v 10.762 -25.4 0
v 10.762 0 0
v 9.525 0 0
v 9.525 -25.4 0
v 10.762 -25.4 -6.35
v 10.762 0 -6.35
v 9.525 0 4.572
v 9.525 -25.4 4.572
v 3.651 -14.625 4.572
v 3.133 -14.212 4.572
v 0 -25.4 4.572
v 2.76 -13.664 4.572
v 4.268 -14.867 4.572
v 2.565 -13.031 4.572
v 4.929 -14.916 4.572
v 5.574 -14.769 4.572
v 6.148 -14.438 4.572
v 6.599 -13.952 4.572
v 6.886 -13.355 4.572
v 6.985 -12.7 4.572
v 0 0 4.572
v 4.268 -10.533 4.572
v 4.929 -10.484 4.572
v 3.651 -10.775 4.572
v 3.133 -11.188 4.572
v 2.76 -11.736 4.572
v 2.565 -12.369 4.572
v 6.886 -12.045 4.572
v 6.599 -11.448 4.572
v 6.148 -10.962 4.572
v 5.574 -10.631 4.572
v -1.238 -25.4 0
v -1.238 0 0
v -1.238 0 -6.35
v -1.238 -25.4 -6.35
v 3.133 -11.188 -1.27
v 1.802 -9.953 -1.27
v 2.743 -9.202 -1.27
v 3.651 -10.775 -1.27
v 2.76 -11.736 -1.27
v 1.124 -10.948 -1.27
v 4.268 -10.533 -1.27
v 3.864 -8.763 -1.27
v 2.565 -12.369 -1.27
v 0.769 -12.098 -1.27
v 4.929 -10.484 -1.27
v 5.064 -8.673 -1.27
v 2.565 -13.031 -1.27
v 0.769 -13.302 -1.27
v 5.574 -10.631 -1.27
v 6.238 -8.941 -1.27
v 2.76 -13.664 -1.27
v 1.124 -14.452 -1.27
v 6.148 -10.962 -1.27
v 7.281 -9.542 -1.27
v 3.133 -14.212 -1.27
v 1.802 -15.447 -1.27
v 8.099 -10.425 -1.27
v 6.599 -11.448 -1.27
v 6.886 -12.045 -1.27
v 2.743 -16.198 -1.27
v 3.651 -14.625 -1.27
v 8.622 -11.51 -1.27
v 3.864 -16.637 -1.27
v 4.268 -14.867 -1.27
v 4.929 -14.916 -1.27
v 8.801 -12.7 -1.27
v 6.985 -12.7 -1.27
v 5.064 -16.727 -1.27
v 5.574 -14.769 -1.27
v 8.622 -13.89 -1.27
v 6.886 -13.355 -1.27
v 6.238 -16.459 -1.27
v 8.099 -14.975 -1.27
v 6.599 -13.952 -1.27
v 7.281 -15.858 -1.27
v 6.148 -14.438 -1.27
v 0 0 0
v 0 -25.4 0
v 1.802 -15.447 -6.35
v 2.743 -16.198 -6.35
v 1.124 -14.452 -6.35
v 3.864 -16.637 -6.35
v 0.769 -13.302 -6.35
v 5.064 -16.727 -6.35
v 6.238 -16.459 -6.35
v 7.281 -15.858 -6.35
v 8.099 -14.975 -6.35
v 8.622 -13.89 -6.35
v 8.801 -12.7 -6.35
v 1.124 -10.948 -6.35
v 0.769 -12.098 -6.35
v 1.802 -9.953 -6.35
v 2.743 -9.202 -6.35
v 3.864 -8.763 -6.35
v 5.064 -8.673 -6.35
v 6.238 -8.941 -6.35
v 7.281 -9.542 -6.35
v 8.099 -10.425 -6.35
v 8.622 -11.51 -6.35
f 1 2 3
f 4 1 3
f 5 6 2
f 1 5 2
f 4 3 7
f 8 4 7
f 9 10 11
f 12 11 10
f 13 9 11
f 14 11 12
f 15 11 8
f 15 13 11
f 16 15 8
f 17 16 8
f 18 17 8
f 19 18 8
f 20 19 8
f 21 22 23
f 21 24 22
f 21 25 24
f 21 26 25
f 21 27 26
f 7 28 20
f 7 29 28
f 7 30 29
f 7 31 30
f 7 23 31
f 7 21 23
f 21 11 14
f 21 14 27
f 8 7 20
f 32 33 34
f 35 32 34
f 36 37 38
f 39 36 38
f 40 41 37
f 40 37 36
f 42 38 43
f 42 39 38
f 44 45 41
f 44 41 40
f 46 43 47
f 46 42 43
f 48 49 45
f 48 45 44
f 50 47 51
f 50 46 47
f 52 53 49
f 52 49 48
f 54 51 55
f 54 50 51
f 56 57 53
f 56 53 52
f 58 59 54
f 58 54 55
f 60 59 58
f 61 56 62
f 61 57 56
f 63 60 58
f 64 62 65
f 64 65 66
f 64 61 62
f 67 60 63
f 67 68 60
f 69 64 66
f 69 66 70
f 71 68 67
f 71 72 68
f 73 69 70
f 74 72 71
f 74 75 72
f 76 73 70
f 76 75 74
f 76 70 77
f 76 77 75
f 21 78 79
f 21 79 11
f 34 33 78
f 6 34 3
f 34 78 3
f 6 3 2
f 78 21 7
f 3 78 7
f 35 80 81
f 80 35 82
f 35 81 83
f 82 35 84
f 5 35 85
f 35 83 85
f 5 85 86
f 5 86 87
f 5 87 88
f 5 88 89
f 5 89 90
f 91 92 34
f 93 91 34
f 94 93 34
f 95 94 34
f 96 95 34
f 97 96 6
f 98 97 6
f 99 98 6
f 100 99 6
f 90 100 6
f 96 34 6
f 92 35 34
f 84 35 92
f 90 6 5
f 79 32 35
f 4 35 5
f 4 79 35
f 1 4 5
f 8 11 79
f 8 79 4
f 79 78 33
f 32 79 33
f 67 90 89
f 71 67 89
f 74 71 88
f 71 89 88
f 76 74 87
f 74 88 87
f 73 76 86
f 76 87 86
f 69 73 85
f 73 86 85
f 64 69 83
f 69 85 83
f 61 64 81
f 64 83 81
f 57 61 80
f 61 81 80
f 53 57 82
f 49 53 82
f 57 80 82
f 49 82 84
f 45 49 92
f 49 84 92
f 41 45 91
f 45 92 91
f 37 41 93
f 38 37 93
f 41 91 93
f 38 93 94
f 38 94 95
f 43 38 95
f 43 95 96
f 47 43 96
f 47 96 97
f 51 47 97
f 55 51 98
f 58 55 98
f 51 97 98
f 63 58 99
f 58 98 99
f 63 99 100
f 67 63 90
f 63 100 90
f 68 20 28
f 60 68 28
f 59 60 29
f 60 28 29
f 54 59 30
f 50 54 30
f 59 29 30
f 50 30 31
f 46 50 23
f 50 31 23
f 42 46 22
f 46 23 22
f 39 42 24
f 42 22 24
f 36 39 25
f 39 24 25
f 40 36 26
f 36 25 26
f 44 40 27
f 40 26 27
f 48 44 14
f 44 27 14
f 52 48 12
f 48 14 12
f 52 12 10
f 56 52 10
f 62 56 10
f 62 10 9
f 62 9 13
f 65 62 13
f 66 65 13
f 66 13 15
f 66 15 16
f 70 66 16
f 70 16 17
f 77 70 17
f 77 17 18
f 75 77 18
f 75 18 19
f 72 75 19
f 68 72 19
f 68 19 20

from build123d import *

# Parameters (mm, degrees)
F0_W     = 9.525
F0_H     = 4.572
F1_DEPTH = 25.4
F2_R     = 2.2225
F3_DEPTH = 10.923
F4_R     = 4.0386
F5_DEPTH = 5.08


with BuildPart() as f1:
    # F0 (on Front) → F1 (new body)
    with BuildSketch(Plane.XZ):
        with Locations((4.7625, 2.286)):
            Rectangle(F0_W, F0_H)
        Polygon((9.525, 0), (0, 0), (-1.2375, 0), (-1.2375, -6.35), (10.7625, -6.35), (10.7625, 0), align=None)
    extrude(amount=F1_DEPTH)

    # F2 (on face) → F3 (cut, through all)
    with BuildSketch(Plane.XY.offset(4.572)):
        with Locations((4.7625, -12.7)):
            Circle(F2_R)
    extrude(amount=-F3_DEPTH, mode=Mode.SUBTRACT)

    # F4 (on face) → F5 (cut)
    with BuildSketch(Plane(origin=(0, 0, -6.35), x_dir=(1, 0, 0), z_dir=(0, 0, -1))):
        with Locations((4.7625, 12.7)):
            Circle(F4_R)
    extrude(amount=-F5_DEPTH, mode=Mode.SUBTRACT)


solid = f1.part
